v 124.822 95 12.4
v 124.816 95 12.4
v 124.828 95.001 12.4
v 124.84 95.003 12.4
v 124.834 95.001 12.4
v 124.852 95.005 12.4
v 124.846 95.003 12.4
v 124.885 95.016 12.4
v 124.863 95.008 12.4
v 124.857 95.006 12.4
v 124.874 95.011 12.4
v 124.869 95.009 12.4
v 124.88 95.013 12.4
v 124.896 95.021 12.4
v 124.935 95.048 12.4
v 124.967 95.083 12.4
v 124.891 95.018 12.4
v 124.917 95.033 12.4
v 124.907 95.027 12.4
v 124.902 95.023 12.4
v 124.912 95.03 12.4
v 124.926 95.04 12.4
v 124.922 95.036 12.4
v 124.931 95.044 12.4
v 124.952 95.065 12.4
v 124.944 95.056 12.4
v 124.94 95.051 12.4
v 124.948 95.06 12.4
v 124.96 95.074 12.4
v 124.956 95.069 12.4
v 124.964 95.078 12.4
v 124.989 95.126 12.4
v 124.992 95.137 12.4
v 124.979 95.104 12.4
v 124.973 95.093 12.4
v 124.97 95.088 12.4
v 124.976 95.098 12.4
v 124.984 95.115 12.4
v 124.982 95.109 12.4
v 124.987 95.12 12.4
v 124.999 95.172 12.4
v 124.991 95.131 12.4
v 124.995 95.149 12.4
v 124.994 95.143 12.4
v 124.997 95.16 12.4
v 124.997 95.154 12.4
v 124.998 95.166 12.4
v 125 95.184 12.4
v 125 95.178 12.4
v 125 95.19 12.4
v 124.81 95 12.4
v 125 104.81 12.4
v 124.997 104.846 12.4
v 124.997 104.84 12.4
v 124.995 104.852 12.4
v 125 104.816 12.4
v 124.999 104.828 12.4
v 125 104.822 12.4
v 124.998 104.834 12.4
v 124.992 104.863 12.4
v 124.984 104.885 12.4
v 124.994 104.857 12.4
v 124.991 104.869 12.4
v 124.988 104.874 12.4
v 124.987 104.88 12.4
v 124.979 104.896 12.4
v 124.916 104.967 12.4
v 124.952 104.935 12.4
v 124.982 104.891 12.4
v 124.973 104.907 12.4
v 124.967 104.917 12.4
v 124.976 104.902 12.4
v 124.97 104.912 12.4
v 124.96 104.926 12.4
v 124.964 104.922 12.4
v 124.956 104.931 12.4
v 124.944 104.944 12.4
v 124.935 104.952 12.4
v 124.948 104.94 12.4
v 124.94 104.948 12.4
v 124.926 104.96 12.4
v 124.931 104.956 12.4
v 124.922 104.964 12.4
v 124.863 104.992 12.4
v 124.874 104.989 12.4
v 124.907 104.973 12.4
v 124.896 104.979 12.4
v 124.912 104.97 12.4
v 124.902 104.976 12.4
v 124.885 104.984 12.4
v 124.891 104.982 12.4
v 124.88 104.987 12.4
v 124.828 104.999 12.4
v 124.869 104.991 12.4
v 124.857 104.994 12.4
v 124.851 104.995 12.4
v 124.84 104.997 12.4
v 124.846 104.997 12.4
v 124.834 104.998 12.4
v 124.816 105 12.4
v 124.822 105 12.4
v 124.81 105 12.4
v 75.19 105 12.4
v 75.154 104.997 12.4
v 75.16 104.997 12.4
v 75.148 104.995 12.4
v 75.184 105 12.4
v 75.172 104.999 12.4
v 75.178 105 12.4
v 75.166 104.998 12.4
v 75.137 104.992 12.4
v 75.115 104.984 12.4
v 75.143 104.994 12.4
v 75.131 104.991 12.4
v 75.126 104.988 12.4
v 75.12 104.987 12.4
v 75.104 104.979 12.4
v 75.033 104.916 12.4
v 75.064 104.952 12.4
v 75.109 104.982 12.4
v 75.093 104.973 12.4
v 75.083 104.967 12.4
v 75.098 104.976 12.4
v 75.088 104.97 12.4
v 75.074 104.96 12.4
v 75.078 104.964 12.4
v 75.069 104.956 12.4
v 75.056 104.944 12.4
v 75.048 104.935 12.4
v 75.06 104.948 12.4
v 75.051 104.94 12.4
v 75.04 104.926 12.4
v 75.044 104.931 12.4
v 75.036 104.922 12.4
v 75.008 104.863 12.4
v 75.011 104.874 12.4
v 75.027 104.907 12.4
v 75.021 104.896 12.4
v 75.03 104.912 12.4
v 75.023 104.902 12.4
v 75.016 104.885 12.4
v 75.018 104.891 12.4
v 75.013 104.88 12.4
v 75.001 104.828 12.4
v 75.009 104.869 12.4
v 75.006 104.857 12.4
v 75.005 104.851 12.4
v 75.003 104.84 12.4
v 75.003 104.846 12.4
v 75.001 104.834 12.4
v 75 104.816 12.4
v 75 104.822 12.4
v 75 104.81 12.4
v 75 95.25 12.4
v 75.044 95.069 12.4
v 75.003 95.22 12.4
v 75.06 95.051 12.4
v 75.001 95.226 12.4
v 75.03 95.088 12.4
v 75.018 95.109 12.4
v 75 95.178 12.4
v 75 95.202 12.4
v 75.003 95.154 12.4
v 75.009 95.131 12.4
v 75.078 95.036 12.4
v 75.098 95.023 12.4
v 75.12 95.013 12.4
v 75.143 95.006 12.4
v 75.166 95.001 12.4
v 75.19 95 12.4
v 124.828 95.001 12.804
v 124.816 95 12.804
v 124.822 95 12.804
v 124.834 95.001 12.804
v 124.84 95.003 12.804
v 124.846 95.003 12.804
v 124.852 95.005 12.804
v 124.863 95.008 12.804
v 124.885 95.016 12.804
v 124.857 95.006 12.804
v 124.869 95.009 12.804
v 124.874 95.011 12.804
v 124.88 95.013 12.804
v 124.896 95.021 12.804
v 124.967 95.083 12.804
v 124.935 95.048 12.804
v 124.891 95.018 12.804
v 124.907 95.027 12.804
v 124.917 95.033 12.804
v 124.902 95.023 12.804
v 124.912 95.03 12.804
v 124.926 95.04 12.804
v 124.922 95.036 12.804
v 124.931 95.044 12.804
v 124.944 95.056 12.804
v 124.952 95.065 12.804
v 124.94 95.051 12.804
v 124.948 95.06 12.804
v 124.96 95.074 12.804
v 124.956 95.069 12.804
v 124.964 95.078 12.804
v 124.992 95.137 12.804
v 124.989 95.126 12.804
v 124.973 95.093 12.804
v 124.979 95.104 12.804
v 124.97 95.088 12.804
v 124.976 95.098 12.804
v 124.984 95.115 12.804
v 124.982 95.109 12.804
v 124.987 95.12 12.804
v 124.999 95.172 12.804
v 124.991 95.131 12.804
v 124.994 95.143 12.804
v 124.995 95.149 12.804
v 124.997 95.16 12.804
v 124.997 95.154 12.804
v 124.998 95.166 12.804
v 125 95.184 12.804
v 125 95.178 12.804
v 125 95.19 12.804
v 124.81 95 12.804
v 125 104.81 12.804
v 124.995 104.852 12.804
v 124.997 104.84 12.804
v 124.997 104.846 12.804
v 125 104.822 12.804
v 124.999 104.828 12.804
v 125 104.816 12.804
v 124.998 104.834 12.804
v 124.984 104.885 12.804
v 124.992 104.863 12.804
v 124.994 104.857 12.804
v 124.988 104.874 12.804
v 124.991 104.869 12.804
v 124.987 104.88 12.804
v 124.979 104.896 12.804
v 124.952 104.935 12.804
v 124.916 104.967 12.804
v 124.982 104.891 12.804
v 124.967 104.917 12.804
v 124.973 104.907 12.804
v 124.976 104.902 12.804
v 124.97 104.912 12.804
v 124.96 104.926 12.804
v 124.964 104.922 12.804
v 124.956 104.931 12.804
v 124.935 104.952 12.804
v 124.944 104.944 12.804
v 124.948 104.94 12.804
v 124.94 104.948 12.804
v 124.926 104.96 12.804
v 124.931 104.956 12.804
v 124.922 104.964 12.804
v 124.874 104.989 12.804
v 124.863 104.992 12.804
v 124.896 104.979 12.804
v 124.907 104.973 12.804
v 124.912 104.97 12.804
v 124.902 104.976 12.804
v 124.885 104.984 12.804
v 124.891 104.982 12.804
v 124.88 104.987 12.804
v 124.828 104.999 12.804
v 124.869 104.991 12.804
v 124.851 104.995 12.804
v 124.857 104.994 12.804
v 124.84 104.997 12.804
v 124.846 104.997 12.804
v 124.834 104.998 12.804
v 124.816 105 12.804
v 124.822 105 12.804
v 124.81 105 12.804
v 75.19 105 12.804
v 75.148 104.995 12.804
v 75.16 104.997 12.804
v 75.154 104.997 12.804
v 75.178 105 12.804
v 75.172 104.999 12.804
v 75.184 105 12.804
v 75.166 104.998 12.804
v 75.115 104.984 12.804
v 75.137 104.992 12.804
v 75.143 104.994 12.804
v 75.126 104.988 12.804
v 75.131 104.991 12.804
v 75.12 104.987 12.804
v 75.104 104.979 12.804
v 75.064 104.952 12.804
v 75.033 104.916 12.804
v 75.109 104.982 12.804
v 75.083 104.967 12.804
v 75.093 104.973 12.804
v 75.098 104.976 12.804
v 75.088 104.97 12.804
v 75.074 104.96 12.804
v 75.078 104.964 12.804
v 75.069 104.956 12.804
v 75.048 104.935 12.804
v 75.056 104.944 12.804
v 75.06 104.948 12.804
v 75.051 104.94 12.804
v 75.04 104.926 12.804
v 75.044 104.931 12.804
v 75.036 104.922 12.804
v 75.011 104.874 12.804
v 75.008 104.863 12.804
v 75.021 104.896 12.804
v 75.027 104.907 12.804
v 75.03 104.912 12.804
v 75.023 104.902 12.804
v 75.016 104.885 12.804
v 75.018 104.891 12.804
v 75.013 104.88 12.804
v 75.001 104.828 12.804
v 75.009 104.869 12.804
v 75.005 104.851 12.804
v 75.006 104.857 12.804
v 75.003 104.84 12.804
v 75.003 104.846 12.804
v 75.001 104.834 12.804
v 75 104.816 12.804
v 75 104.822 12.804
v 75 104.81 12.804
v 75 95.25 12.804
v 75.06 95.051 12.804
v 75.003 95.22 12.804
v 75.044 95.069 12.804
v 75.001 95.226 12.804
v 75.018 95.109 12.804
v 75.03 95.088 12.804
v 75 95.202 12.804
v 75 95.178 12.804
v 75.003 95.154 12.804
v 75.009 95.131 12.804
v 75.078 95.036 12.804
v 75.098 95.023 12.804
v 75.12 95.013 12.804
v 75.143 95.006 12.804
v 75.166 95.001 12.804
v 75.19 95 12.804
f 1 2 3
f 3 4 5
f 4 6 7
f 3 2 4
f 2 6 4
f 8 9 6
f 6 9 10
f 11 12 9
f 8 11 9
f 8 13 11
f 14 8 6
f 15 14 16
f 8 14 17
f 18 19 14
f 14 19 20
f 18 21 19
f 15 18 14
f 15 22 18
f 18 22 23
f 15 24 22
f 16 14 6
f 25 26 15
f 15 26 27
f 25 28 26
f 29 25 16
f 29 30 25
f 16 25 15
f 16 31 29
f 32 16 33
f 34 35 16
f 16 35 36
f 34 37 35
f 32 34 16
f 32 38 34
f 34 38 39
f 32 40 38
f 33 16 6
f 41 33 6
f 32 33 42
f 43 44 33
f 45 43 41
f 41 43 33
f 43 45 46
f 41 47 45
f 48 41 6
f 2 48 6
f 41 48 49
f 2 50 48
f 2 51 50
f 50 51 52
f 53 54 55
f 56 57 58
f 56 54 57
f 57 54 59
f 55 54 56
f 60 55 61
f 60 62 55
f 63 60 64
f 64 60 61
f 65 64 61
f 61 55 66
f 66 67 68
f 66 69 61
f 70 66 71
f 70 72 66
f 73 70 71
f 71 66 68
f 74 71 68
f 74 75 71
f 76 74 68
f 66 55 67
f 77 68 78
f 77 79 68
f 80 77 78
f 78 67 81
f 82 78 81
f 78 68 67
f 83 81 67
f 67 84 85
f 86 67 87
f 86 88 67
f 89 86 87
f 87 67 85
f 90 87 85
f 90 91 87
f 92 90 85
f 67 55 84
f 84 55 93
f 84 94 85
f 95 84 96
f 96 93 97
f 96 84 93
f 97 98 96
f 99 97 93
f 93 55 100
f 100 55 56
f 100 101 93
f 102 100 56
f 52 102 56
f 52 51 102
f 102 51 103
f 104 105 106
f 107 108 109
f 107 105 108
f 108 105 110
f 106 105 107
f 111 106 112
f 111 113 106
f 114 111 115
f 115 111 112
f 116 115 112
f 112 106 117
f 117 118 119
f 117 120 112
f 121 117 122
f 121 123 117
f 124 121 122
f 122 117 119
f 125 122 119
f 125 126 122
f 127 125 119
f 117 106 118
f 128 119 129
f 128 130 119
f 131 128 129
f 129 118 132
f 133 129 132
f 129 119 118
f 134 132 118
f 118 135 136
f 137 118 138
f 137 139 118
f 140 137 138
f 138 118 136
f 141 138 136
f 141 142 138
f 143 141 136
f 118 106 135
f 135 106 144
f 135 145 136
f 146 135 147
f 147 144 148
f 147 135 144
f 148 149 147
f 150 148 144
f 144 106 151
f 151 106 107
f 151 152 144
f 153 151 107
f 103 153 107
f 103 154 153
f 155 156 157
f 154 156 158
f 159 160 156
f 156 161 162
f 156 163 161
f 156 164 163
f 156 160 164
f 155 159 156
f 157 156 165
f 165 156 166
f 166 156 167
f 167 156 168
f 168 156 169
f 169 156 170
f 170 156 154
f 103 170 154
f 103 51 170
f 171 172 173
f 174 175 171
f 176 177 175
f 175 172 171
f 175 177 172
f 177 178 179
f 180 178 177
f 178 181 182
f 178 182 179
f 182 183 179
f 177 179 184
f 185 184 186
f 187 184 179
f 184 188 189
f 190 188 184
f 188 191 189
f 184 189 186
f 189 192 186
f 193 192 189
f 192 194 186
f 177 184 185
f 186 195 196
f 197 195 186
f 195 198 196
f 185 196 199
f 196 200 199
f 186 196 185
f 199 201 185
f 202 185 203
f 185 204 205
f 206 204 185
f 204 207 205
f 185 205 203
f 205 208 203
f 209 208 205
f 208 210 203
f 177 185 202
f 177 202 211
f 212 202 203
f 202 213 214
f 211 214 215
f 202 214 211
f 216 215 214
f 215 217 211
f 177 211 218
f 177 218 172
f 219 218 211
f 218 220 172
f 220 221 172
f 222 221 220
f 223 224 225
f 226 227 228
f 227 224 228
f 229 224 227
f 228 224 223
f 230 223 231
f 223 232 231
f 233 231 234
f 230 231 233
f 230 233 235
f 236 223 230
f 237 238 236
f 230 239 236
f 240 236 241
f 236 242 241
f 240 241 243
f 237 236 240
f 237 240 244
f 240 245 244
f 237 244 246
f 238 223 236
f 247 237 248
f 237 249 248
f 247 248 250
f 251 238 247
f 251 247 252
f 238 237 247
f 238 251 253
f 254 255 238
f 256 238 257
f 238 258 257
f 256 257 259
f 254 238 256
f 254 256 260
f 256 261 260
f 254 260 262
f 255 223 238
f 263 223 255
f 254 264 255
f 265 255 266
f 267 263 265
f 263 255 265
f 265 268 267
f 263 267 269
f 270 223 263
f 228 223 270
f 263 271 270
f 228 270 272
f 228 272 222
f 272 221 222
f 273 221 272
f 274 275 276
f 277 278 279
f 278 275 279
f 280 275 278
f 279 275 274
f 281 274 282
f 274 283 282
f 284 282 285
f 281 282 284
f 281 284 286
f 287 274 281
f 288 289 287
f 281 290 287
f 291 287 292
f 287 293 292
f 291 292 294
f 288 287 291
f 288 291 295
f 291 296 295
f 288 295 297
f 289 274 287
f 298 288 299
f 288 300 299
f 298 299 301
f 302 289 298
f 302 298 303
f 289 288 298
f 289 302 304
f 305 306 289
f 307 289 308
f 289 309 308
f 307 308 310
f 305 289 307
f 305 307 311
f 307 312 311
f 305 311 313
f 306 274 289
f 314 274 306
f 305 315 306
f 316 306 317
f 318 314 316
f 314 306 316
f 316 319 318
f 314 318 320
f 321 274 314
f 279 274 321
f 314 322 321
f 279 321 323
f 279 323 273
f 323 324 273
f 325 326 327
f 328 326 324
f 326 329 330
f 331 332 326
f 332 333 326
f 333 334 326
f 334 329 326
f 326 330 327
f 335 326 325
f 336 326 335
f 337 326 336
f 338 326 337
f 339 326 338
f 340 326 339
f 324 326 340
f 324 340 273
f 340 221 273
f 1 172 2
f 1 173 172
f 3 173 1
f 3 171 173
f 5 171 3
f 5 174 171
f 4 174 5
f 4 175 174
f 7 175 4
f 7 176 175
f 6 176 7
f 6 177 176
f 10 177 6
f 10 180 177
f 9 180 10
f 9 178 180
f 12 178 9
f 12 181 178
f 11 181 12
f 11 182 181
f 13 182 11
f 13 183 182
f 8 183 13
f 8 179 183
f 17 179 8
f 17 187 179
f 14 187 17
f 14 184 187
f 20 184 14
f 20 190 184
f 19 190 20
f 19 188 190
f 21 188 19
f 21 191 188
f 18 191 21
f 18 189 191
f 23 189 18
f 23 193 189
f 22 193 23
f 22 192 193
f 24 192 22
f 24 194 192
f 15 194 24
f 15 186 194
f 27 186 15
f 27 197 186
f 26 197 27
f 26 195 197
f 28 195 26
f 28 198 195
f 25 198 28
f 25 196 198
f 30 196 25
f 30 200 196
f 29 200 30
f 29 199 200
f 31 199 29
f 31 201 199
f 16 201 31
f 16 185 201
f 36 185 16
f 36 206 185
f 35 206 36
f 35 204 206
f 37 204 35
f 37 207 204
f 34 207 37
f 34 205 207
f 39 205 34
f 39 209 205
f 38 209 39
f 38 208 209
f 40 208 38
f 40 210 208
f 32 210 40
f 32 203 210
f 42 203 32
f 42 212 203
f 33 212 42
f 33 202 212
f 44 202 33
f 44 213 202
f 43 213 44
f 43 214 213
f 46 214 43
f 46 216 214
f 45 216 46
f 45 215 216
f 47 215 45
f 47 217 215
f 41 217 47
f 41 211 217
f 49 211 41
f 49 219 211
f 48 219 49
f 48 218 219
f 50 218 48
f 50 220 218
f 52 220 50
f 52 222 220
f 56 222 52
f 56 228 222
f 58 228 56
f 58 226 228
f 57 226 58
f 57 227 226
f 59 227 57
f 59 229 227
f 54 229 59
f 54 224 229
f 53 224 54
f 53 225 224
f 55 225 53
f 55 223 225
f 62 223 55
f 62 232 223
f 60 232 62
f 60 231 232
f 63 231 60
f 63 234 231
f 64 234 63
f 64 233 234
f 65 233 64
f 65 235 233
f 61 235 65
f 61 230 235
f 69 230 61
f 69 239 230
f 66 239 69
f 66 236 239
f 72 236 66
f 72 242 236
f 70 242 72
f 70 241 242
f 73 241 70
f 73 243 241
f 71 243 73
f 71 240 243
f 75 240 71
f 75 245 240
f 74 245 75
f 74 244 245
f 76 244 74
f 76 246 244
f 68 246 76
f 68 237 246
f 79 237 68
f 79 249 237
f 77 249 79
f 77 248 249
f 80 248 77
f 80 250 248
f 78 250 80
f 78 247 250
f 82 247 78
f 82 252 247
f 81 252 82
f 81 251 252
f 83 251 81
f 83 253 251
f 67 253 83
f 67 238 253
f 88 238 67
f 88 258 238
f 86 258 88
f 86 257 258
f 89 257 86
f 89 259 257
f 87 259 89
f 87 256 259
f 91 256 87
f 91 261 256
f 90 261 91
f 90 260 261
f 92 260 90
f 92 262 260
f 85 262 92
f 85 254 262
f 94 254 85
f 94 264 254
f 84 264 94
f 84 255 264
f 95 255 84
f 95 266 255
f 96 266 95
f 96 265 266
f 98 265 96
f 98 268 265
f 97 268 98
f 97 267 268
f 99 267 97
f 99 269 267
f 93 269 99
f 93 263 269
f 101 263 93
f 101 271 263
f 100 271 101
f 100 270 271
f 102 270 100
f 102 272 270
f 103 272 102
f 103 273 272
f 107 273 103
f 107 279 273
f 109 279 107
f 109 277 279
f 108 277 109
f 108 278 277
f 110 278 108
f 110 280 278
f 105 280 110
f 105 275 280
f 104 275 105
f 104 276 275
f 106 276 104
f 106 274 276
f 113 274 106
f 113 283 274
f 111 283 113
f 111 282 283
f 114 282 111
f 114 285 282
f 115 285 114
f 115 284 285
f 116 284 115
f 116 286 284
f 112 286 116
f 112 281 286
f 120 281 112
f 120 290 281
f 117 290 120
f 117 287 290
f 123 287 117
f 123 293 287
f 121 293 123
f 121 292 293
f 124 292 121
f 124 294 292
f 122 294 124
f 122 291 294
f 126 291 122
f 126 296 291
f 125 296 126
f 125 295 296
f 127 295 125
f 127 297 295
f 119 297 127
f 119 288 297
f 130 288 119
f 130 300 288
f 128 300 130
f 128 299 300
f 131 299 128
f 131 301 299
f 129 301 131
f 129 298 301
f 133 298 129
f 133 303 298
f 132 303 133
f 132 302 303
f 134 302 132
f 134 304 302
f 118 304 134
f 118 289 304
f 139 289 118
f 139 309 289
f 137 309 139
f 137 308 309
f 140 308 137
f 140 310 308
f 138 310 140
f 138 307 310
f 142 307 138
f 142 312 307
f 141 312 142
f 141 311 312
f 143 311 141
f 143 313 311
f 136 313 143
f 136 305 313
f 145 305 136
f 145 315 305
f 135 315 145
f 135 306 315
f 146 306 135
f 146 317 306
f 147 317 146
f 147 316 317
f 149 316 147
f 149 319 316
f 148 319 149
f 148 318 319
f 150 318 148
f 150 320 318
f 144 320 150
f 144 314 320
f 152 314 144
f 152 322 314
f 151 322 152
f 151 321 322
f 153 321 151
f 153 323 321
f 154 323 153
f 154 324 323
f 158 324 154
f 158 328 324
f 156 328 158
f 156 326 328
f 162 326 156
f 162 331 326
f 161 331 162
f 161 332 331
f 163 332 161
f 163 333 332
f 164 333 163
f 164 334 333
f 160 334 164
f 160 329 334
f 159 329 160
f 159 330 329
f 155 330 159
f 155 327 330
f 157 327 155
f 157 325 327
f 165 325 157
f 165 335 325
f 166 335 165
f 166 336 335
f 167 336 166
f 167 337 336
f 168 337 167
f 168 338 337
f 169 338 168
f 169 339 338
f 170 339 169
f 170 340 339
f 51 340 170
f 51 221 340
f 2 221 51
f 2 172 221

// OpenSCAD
module drawBasicShape(x1, y1, x2, y2, width)
{
	length = sqrt((x1-x2)*(x1-x2) + (y1-y2)*(y1-y2));
	if (width!=0.0) {
		square(size = [width, length], center = false);
		translate([width/2.0, 0, 0]) circle(d=width);
		translate([width/2.0, length, 0]) circle(d=width);
	}
}

module translateAndRotate(x1, y1, x2, y2, width)
{
	if (width != 0.0) {
		angle = atan((y2-y1)/(x2-x1)) +270;
		if (x2>=x1) {
			translate([x1, y1, 0.0]) rotate([0.0, 0.0, angle]) translate([-width/2.0, 0.0, 0.0]) scale([1.0, 1.0, 1.0]) drawBasicShape(x1, y1, x2, y2, width);
		}
		else {
			translate([x1, y1, 0.0]) rotate([0.0, 0.0, angle+180]) translate([-width/2.0, 0.0, 0.0]) scale([1.0, 1.0, 1.0]) drawBasicShape(x1, y1, x2, y2, width);		}
	}
}

$fn=50;

points30 = [
[75.77800000, 95.77800000, 0.00000000],
[124.22200000, 95.77800000, 0.37999548],
[124.22200000, 104.22200000, 0.37997788],
[75.77800000, 104.22200000, 0.37999672],
[75.77800000, 95.83800000, 0.37997423],
[75.48400000, 95.48400000, 0.00000000],
[124.51600000, 95.48400000, 0.37999868],
[124.51600000, 104.51600000, 0.37998977],
[75.48400000, 104.51600000, 0.37999746],
[75.48400000, 95.54400000, 0.37999314],
[75.19000000, 95.19000000, 0.00000000],
[124.81000000, 95.19000000, 0.37999939],
[124.81000000, 104.81000000, 0.38000021],
[75.19000000, 104.81000000, 0.38000060],
[75.19000000, 95.25000000, 0.37999715],
[75.53600000, 95.39000000, 0.00000000],
[75.94600000, 103.88900000, 0.00000000],
[76.11100000, 104.05400000, 0.37961375],
[76.52800000, 104.05400000, 0.38001190],
[75.94600000, 103.47200000, 0.37989934],
[75.94600000, 103.05500000, 0.38001190],
[76.94500000, 104.05400000, 0.37998907],
[77.36200000, 104.05400000, 0.38001190],
[75.94600000, 102.63800000, 0.37999592],
[75.94600000, 102.22100000, 0.38001190],
[77.77900000, 104.05400000, 0.37999966],
[78.19600000, 104.05400000, 0.38001190],
[75.94600000, 101.80400000, 0.38002091],
[75.94600000, 101.38700000, 0.38001190],
[78.61300000, 104.05400000, 0.38001957],
[79.03000000, 104.05400000, 0.38001190],
[75.94600000, 100.97000000, 0.38001859],
[75.94600000, 100.55300000, 0.38001190],
[79.44700000, 104.05400000, 0.38002999],
[79.86400000, 104.05400000, 0.38001190],
[75.94600000, 100.13600000, 0.38002811],
[75.94600000, 99.71900000, 0.38001190],
[80.28100000, 104.05400000, 0.38002660],
[80.69800000, 104.05400000, 0.38001190],
[75.94600000, 99.30200000, 0.38002534],
[75.94600000, 98.88500000, 0.38015610],
[81.11500000, 104.05400000, 0.38002430],
[81.53300000, 104.05400000, 0.37945200],
[75.94600000, 98.46700000, 0.37997836],
[75.94600000, 98.05000000, 0.38001190],
[81.95000000, 104.05400000, 0.37998072],
[82.36700000, 104.05400000, 0.38015610],
[75.94600000, 97.63300000, 0.37998277],
[75.94600000, 97.21600000, 0.38001190],
[82.78400000, 104.05400000, 0.37999079],
[83.20100000, 104.05400000, 0.38015610],
[75.94600000, 96.79900000, 0.37999203],
[75.94600000, 96.38200000, 0.38001190],
[83.61800000, 104.05400000, 0.37999868],
[84.03500000, 104.05400000, 0.38001190],
[75.95600000, 95.97600000, 0.38000275],
[76.34400000, 95.94600000, 0.37958004],
[84.45200000, 104.05400000, 0.38000229],
[84.86900000, 104.05400000, 0.38015610],
[76.76100000, 95.94600000, 0.38000229],
[77.17800000, 95.94600000, 0.38001190],
[85.28600000, 104.05400000, 0.38000754],
[85.70300000, 104.05400000, 0.38001190],
[77.59500000, 95.94600000, 0.38000229],
[78.01200000, 95.94600000, 0.38001190],
[86.12000000, 104.05400000, 0.38000754],
[86.53700000, 104.05400000, 0.38001190],
[78.42900000, 95.94600000, 0.38000229],
[78.84600000, 95.94600000, 0.38015610],
[86.95400000, 104.05400000, 0.38000229],
[87.37100000, 104.05400000, 0.38001190],
[79.26300000, 95.94600000, 0.38000754],
[79.68000000, 95.94600000, 0.38001190],
[87.78900000, 104.05400000, 0.37998415],
[88.20600000, 104.05400000, 0.38001190],
[80.09700000, 95.94600000, 0.37998940],
[80.51500000, 95.94600000, 0.37930814],
[88.62300000, 104.05400000, 0.38000229],
[89.04000000, 104.05400000, 0.38015610],
[80.93200000, 95.94600000, 0.38000229],
[81.34900000, 95.94600000, 0.38001190],
[89.45700000, 104.05400000, 0.38000754],
[89.87400000, 104.05400000, 0.38001190],
[81.76600000, 95.94600000, 0.38000229],
[82.18300000, 95.94600000, 0.38001190],
[90.29100000, 104.05400000, 0.38000754],
[90.70800000, 104.05400000, 0.38001190],
[82.60000000, 95.94600000, 0.38000229],
[83.01700000, 95.94600000, 0.38015610],
[91.12500000, 104.05400000, 0.38000229],
[91.54200000, 104.05400000, 0.38001190],
[83.43400000, 95.94600000, 0.38000754],
[83.85100000, 95.94600000, 0.38001190],
[91.95900000, 104.05400000, 0.38000229],
[92.37600000, 104.05400000, 0.38001190],
[84.26800000, 95.94600000, 0.38000754],
[84.68500000, 95.94600000, 0.38001190],
[92.79300000, 104.05400000, 0.38000229],
[93.21000000, 104.05400000, 0.38015610],
[85.10200000, 95.94600000, 0.38000229],
[85.51900000, 95.94600000, 0.38001190],
[93.62700000, 104.05400000, 0.38000754],
[94.04400000, 104.05400000, 0.38001190],
[85.93600000, 95.94600000, 0.38000229],
[86.35300000, 95.94600000, 0.38001190],
[94.46200000, 104.05400000, 0.37998940],
[94.87900000, 104.05400000, 0.38001190],
[86.77000000, 95.94600000, 0.37998415],
[87.18800000, 95.94600000, 0.37945200],
[95.29600000, 104.05400000, 0.38000229],
[95.71300000, 104.05400000, 0.38001190],
[87.60500000, 95.94600000, 0.38000754],
[88.02200000, 95.94600000, 0.38001190],
[96.13000000, 104.05400000, 0.38000229],
[96.54700000, 104.05400000, 0.38001190],
[88.43900000, 95.94600000, 0.38000754],
[88.85600000, 95.94600000, 0.38001190],
[96.96400000, 104.05400000, 0.38000229],
[97.38100000, 104.05400000, 0.38015610],
[89.27300000, 95.94600000, 0.38000229],
[89.69000000, 95.94600000, 0.38001190],
[97.79800000, 104.05400000, 0.38000229],
[98.21500000, 104.05400000, 0.38015610],
[90.10700000, 95.94600000, 0.38000229],
[90.52400000, 95.94600000, 0.38001190],
[98.63200000, 104.05400000, 0.38000754],
[99.04900000, 104.05400000, 0.38001190],
[90.94100000, 95.94600000, 0.38000229],
[91.35800000, 95.94600000, 0.38015610],
[99.46600000, 104.05400000, 0.38000229],
[99.88300000, 104.05400000, 0.38001190],
[91.77500000, 95.94600000, 0.38000229],
[92.19200000, 95.94600000, 0.38015610],
[100.30000000, 104.05400000, 0.38000229],
[100.71800000, 104.05400000, 0.37930814],
[92.60900000, 95.94600000, 0.37998940],
[93.02600000, 95.94600000, 0.38001190],
[101.13500000, 104.05400000, 0.37998415],
[101.55200000, 104.05400000, 0.38001190],
[93.44400000, 95.94600000, 0.38000754],
[93.86100000, 95.94600000, 0.38001190],
[101.96900000, 104.05400000, 0.38000229],
[102.38600000, 104.05400000, 0.38015610],
[94.27800000, 95.94600000, 0.38000229],
[94.69500000, 95.94600000, 0.38001190],
[102.80300000, 104.05400000, 0.38000754],
[103.22000000, 104.05400000, 0.38001190],
[95.11200000, 95.94600000, 0.38000229],
[95.52900000, 95.94600000, 0.38001190],
[103.63700000, 104.05400000, 0.38000754],
[104.05400000, 104.05400000, 0.38001190],
[95.94600000, 95.94600000, 0.38000229],
[96.36300000, 95.94600000, 0.38015610],
[104.47100000, 104.05400000, 0.38000229],
[104.88800000, 104.05400000, 0.38001190],
[96.78000000, 95.94600000, 0.38000754],
[97.19700000, 95.94600000, 0.38001190],
[105.30500000, 104.05400000, 0.38000229],
[105.72200000, 104.05400000, 0.38001190],
[97.61400000, 95.94600000, 0.38000754],
[98.03100000, 95.94600000, 0.38001190],
[106.13900000, 104.05400000, 0.38000229],
[106.55600000, 104.05400000, 0.38015610],
[98.44800000, 95.94600000, 0.38000229],
[98.86500000, 95.94600000, 0.38001190],
[106.97300000, 104.05400000, 0.38000754],
[107.39100000, 104.05400000, 0.37930814],
[99.28200000, 95.94600000, 0.37998415],
[99.69900000, 95.94600000, 0.38001190],
[107.80800000, 104.05400000, 0.37998940],
[108.22500000, 104.05400000, 0.38001190],
[100.11700000, 95.94600000, 0.38000229],
[100.53400000, 95.94600000, 0.38015610],
[108.64200000, 104.05400000, 0.38000229],
[109.05900000, 104.05400000, 0.38001190],
[100.95100000, 95.94600000, 0.38000754],
[101.36800000, 95.94600000, 0.38001190],
[109.47600000, 104.05400000, 0.38000229],
[109.89300000, 104.05400000, 0.38001190],
[101.78500000, 95.94600000, 0.38000754],
[102.20200000, 95.94600000, 0.38001190],
[110.31000000, 104.05400000, 0.38000229],
[110.72700000, 104.05400000, 0.38015610],
[102.61900000, 95.94600000, 0.38000229],
[103.03600000, 95.94600000, 0.38001190],
[111.14400000, 104.05400000, 0.38000229],
[111.56100000, 104.05400000, 0.38015610],
[103.45300000, 95.94600000, 0.38000229],
[103.87000000, 95.94600000, 0.38001190],
[111.97800000, 104.05400000, 0.38000754],
[112.39500000, 104.05400000, 0.38001190],
[104.28700000, 95.94600000, 0.38000229],
[104.70400000, 95.94600000, 0.38015610],
[112.81200000, 104.05400000, 0.38000229],
[113.22900000, 104.05400000, 0.38001190],
[105.12100000, 95.94600000, 0.38000229],
[105.53800000, 95.94600000, 0.38015610],
[113.64700000, 104.05400000, 0.37998415],
[114.06400000, 104.05400000, 0.38001190],
[105.95500000, 95.94600000, 0.37998940],
[106.37300000, 95.94600000, 0.37930814],
[114.48100000, 104.05400000, 0.38000229],
[114.89800000, 104.05400000, 0.38001190],
[106.79000000, 95.94600000, 0.38000754],
[107.20700000, 95.94600000, 0.38001190],
[115.31500000, 104.05400000, 0.38000229],
[115.73200000, 104.05400000, 0.38015610],
[107.62400000, 95.94600000, 0.38000229],
[108.04100000, 95.94600000, 0.38001190],
[116.14900000, 104.05400000, 0.38000754],
[116.56600000, 104.05400000, 0.38001190],
[108.45800000, 95.94600000, 0.38000229],
[108.87500000, 95.94600000, 0.38001190],
[116.98300000, 104.05400000, 0.38000754],
[117.40000000, 104.05400000, 0.38001190],
[109.29200000, 95.94600000, 0.38000229],
[109.70900000, 95.94600000, 0.38015610],
[117.81700000, 104.05400000, 0.38000229],
[118.23400000, 104.05400000, 0.38001190],
[110.12600000, 95.94600000, 0.38000754],
[110.54300000, 95.94600000, 0.38001190],
[118.65100000, 104.05400000, 0.38000229],
[119.06800000, 104.05400000, 0.38001190],
[110.96000000, 95.94600000, 0.38000754],
[111.37700000, 95.94600000, 0.38001190],
[119.48500000, 104.05400000, 0.38000229],
[119.90200000, 104.05400000, 0.38015610],
[111.79400000, 95.94600000, 0.38000229],
[112.21100000, 95.94600000, 0.38001190],
[120.32000000, 104.05400000, 0.37998940],
[120.73700000, 104.05400000, 0.38001190],
[112.62900000, 95.94600000, 0.38000229],
[113.04600000, 95.94600000, 0.38001190],
[121.15400000, 104.05400000, 0.38000754],
[121.57100000, 104.05400000, 0.38001190],
[113.46300000, 95.94600000, 0.38000229],
[113.88000000, 95.94600000, 0.38015610],
[121.98800000, 104.05400000, 0.38000229],
[122.40500000, 104.05400000, 0.38001190],
[114.29700000, 95.94600000, 0.38000229],
[114.71400000, 95.94600000, 0.38015610],
[122.82200000, 104.05400000, 0.38000229],
[123.23900000, 104.05400000, 0.38001190],
[115.13100000, 95.94600000, 0.38000754],
[115.54800000, 95.94600000, 0.38001190],
[123.65600000, 104.05400000, 0.38000229],
[124.04400000, 104.02500000, 0.37963728],
[115.96500000, 95.94600000, 0.37998455],
[116.38200000, 95.94600000, 0.38015610],
[124.05400000, 103.61800000, 0.37999868],
[124.05400000, 103.20100000, 0.38001190],
[116.79900000, 95.94600000, 0.37999789],
[117.21600000, 95.94600000, 0.38001190],
[124.05400000, 102.78400000, 0.37999079],
[124.05400000, 102.36700000, 0.38001190],
[117.63300000, 95.94600000, 0.37998939],
[118.05000000, 95.94600000, 0.38015610],
[124.05400000, 101.95000000, 0.37998072],
[124.05400000, 101.53300000, 0.38015610],
[118.46700000, 95.94600000, 0.37997836],
[118.88400000, 95.94600000, 0.38001190],
[124.05400000, 101.11600000, 0.37997562],
[124.05400000, 100.69800000, 0.37945200],
[119.30200000, 95.94600000, 0.38002534],
[119.71900000, 95.94600000, 0.38015610],
[124.05400000, 100.28100000, 0.38002660],
[124.05400000, 99.86400000, 0.38001190],
[120.13600000, 95.94600000, 0.38002811],
[120.55300000, 95.94600000, 0.38001190],
[124.05400000, 99.44700000, 0.38002999],
[124.05400000, 99.03000000, 0.38001190],
[120.97000000, 95.94600000, 0.38003238],
[121.38700000, 95.94600000, 0.38001190],
[124.05400000, 98.61300000, 0.38001957],
[124.05400000, 98.19600000, 0.38001190],
[121.80400000, 95.94600000, 0.38002091],
[122.22100000, 95.94600000, 0.38001190],
[124.05400000, 97.77900000, 0.38002285],
[124.05400000, 97.36200000, 0.38001190],
[122.63800000, 95.94600000, 0.37999592],
[123.05500000, 95.94600000, 0.38001190],
[124.05400000, 96.94500000, 0.37998907],
[124.05400000, 96.52800000, 0.38001190],
[123.47200000, 95.94600000, 0.37997240],
[123.88900000, 95.94600000, 0.38001190],
[124.05400000, 96.11100000, 0.37961375],
];

translate([0.0, 0.0, 12.40000000]) {
	linear_extrude(height = 0.40400000, center = false, convexity = 10, twist = 0) {
		union() {
			for( i=[0:len(points30)-2] ){ 
				x1 = points30[i][0];
				y1 = points30[i][1];
				x2 = points30[i+1][0];
				y2 = points30[i+1][1];
				width = points30[i+1][2];
				translateAndRotate(x1, y1, x2, y2, width);
			}
		}
	}
}
